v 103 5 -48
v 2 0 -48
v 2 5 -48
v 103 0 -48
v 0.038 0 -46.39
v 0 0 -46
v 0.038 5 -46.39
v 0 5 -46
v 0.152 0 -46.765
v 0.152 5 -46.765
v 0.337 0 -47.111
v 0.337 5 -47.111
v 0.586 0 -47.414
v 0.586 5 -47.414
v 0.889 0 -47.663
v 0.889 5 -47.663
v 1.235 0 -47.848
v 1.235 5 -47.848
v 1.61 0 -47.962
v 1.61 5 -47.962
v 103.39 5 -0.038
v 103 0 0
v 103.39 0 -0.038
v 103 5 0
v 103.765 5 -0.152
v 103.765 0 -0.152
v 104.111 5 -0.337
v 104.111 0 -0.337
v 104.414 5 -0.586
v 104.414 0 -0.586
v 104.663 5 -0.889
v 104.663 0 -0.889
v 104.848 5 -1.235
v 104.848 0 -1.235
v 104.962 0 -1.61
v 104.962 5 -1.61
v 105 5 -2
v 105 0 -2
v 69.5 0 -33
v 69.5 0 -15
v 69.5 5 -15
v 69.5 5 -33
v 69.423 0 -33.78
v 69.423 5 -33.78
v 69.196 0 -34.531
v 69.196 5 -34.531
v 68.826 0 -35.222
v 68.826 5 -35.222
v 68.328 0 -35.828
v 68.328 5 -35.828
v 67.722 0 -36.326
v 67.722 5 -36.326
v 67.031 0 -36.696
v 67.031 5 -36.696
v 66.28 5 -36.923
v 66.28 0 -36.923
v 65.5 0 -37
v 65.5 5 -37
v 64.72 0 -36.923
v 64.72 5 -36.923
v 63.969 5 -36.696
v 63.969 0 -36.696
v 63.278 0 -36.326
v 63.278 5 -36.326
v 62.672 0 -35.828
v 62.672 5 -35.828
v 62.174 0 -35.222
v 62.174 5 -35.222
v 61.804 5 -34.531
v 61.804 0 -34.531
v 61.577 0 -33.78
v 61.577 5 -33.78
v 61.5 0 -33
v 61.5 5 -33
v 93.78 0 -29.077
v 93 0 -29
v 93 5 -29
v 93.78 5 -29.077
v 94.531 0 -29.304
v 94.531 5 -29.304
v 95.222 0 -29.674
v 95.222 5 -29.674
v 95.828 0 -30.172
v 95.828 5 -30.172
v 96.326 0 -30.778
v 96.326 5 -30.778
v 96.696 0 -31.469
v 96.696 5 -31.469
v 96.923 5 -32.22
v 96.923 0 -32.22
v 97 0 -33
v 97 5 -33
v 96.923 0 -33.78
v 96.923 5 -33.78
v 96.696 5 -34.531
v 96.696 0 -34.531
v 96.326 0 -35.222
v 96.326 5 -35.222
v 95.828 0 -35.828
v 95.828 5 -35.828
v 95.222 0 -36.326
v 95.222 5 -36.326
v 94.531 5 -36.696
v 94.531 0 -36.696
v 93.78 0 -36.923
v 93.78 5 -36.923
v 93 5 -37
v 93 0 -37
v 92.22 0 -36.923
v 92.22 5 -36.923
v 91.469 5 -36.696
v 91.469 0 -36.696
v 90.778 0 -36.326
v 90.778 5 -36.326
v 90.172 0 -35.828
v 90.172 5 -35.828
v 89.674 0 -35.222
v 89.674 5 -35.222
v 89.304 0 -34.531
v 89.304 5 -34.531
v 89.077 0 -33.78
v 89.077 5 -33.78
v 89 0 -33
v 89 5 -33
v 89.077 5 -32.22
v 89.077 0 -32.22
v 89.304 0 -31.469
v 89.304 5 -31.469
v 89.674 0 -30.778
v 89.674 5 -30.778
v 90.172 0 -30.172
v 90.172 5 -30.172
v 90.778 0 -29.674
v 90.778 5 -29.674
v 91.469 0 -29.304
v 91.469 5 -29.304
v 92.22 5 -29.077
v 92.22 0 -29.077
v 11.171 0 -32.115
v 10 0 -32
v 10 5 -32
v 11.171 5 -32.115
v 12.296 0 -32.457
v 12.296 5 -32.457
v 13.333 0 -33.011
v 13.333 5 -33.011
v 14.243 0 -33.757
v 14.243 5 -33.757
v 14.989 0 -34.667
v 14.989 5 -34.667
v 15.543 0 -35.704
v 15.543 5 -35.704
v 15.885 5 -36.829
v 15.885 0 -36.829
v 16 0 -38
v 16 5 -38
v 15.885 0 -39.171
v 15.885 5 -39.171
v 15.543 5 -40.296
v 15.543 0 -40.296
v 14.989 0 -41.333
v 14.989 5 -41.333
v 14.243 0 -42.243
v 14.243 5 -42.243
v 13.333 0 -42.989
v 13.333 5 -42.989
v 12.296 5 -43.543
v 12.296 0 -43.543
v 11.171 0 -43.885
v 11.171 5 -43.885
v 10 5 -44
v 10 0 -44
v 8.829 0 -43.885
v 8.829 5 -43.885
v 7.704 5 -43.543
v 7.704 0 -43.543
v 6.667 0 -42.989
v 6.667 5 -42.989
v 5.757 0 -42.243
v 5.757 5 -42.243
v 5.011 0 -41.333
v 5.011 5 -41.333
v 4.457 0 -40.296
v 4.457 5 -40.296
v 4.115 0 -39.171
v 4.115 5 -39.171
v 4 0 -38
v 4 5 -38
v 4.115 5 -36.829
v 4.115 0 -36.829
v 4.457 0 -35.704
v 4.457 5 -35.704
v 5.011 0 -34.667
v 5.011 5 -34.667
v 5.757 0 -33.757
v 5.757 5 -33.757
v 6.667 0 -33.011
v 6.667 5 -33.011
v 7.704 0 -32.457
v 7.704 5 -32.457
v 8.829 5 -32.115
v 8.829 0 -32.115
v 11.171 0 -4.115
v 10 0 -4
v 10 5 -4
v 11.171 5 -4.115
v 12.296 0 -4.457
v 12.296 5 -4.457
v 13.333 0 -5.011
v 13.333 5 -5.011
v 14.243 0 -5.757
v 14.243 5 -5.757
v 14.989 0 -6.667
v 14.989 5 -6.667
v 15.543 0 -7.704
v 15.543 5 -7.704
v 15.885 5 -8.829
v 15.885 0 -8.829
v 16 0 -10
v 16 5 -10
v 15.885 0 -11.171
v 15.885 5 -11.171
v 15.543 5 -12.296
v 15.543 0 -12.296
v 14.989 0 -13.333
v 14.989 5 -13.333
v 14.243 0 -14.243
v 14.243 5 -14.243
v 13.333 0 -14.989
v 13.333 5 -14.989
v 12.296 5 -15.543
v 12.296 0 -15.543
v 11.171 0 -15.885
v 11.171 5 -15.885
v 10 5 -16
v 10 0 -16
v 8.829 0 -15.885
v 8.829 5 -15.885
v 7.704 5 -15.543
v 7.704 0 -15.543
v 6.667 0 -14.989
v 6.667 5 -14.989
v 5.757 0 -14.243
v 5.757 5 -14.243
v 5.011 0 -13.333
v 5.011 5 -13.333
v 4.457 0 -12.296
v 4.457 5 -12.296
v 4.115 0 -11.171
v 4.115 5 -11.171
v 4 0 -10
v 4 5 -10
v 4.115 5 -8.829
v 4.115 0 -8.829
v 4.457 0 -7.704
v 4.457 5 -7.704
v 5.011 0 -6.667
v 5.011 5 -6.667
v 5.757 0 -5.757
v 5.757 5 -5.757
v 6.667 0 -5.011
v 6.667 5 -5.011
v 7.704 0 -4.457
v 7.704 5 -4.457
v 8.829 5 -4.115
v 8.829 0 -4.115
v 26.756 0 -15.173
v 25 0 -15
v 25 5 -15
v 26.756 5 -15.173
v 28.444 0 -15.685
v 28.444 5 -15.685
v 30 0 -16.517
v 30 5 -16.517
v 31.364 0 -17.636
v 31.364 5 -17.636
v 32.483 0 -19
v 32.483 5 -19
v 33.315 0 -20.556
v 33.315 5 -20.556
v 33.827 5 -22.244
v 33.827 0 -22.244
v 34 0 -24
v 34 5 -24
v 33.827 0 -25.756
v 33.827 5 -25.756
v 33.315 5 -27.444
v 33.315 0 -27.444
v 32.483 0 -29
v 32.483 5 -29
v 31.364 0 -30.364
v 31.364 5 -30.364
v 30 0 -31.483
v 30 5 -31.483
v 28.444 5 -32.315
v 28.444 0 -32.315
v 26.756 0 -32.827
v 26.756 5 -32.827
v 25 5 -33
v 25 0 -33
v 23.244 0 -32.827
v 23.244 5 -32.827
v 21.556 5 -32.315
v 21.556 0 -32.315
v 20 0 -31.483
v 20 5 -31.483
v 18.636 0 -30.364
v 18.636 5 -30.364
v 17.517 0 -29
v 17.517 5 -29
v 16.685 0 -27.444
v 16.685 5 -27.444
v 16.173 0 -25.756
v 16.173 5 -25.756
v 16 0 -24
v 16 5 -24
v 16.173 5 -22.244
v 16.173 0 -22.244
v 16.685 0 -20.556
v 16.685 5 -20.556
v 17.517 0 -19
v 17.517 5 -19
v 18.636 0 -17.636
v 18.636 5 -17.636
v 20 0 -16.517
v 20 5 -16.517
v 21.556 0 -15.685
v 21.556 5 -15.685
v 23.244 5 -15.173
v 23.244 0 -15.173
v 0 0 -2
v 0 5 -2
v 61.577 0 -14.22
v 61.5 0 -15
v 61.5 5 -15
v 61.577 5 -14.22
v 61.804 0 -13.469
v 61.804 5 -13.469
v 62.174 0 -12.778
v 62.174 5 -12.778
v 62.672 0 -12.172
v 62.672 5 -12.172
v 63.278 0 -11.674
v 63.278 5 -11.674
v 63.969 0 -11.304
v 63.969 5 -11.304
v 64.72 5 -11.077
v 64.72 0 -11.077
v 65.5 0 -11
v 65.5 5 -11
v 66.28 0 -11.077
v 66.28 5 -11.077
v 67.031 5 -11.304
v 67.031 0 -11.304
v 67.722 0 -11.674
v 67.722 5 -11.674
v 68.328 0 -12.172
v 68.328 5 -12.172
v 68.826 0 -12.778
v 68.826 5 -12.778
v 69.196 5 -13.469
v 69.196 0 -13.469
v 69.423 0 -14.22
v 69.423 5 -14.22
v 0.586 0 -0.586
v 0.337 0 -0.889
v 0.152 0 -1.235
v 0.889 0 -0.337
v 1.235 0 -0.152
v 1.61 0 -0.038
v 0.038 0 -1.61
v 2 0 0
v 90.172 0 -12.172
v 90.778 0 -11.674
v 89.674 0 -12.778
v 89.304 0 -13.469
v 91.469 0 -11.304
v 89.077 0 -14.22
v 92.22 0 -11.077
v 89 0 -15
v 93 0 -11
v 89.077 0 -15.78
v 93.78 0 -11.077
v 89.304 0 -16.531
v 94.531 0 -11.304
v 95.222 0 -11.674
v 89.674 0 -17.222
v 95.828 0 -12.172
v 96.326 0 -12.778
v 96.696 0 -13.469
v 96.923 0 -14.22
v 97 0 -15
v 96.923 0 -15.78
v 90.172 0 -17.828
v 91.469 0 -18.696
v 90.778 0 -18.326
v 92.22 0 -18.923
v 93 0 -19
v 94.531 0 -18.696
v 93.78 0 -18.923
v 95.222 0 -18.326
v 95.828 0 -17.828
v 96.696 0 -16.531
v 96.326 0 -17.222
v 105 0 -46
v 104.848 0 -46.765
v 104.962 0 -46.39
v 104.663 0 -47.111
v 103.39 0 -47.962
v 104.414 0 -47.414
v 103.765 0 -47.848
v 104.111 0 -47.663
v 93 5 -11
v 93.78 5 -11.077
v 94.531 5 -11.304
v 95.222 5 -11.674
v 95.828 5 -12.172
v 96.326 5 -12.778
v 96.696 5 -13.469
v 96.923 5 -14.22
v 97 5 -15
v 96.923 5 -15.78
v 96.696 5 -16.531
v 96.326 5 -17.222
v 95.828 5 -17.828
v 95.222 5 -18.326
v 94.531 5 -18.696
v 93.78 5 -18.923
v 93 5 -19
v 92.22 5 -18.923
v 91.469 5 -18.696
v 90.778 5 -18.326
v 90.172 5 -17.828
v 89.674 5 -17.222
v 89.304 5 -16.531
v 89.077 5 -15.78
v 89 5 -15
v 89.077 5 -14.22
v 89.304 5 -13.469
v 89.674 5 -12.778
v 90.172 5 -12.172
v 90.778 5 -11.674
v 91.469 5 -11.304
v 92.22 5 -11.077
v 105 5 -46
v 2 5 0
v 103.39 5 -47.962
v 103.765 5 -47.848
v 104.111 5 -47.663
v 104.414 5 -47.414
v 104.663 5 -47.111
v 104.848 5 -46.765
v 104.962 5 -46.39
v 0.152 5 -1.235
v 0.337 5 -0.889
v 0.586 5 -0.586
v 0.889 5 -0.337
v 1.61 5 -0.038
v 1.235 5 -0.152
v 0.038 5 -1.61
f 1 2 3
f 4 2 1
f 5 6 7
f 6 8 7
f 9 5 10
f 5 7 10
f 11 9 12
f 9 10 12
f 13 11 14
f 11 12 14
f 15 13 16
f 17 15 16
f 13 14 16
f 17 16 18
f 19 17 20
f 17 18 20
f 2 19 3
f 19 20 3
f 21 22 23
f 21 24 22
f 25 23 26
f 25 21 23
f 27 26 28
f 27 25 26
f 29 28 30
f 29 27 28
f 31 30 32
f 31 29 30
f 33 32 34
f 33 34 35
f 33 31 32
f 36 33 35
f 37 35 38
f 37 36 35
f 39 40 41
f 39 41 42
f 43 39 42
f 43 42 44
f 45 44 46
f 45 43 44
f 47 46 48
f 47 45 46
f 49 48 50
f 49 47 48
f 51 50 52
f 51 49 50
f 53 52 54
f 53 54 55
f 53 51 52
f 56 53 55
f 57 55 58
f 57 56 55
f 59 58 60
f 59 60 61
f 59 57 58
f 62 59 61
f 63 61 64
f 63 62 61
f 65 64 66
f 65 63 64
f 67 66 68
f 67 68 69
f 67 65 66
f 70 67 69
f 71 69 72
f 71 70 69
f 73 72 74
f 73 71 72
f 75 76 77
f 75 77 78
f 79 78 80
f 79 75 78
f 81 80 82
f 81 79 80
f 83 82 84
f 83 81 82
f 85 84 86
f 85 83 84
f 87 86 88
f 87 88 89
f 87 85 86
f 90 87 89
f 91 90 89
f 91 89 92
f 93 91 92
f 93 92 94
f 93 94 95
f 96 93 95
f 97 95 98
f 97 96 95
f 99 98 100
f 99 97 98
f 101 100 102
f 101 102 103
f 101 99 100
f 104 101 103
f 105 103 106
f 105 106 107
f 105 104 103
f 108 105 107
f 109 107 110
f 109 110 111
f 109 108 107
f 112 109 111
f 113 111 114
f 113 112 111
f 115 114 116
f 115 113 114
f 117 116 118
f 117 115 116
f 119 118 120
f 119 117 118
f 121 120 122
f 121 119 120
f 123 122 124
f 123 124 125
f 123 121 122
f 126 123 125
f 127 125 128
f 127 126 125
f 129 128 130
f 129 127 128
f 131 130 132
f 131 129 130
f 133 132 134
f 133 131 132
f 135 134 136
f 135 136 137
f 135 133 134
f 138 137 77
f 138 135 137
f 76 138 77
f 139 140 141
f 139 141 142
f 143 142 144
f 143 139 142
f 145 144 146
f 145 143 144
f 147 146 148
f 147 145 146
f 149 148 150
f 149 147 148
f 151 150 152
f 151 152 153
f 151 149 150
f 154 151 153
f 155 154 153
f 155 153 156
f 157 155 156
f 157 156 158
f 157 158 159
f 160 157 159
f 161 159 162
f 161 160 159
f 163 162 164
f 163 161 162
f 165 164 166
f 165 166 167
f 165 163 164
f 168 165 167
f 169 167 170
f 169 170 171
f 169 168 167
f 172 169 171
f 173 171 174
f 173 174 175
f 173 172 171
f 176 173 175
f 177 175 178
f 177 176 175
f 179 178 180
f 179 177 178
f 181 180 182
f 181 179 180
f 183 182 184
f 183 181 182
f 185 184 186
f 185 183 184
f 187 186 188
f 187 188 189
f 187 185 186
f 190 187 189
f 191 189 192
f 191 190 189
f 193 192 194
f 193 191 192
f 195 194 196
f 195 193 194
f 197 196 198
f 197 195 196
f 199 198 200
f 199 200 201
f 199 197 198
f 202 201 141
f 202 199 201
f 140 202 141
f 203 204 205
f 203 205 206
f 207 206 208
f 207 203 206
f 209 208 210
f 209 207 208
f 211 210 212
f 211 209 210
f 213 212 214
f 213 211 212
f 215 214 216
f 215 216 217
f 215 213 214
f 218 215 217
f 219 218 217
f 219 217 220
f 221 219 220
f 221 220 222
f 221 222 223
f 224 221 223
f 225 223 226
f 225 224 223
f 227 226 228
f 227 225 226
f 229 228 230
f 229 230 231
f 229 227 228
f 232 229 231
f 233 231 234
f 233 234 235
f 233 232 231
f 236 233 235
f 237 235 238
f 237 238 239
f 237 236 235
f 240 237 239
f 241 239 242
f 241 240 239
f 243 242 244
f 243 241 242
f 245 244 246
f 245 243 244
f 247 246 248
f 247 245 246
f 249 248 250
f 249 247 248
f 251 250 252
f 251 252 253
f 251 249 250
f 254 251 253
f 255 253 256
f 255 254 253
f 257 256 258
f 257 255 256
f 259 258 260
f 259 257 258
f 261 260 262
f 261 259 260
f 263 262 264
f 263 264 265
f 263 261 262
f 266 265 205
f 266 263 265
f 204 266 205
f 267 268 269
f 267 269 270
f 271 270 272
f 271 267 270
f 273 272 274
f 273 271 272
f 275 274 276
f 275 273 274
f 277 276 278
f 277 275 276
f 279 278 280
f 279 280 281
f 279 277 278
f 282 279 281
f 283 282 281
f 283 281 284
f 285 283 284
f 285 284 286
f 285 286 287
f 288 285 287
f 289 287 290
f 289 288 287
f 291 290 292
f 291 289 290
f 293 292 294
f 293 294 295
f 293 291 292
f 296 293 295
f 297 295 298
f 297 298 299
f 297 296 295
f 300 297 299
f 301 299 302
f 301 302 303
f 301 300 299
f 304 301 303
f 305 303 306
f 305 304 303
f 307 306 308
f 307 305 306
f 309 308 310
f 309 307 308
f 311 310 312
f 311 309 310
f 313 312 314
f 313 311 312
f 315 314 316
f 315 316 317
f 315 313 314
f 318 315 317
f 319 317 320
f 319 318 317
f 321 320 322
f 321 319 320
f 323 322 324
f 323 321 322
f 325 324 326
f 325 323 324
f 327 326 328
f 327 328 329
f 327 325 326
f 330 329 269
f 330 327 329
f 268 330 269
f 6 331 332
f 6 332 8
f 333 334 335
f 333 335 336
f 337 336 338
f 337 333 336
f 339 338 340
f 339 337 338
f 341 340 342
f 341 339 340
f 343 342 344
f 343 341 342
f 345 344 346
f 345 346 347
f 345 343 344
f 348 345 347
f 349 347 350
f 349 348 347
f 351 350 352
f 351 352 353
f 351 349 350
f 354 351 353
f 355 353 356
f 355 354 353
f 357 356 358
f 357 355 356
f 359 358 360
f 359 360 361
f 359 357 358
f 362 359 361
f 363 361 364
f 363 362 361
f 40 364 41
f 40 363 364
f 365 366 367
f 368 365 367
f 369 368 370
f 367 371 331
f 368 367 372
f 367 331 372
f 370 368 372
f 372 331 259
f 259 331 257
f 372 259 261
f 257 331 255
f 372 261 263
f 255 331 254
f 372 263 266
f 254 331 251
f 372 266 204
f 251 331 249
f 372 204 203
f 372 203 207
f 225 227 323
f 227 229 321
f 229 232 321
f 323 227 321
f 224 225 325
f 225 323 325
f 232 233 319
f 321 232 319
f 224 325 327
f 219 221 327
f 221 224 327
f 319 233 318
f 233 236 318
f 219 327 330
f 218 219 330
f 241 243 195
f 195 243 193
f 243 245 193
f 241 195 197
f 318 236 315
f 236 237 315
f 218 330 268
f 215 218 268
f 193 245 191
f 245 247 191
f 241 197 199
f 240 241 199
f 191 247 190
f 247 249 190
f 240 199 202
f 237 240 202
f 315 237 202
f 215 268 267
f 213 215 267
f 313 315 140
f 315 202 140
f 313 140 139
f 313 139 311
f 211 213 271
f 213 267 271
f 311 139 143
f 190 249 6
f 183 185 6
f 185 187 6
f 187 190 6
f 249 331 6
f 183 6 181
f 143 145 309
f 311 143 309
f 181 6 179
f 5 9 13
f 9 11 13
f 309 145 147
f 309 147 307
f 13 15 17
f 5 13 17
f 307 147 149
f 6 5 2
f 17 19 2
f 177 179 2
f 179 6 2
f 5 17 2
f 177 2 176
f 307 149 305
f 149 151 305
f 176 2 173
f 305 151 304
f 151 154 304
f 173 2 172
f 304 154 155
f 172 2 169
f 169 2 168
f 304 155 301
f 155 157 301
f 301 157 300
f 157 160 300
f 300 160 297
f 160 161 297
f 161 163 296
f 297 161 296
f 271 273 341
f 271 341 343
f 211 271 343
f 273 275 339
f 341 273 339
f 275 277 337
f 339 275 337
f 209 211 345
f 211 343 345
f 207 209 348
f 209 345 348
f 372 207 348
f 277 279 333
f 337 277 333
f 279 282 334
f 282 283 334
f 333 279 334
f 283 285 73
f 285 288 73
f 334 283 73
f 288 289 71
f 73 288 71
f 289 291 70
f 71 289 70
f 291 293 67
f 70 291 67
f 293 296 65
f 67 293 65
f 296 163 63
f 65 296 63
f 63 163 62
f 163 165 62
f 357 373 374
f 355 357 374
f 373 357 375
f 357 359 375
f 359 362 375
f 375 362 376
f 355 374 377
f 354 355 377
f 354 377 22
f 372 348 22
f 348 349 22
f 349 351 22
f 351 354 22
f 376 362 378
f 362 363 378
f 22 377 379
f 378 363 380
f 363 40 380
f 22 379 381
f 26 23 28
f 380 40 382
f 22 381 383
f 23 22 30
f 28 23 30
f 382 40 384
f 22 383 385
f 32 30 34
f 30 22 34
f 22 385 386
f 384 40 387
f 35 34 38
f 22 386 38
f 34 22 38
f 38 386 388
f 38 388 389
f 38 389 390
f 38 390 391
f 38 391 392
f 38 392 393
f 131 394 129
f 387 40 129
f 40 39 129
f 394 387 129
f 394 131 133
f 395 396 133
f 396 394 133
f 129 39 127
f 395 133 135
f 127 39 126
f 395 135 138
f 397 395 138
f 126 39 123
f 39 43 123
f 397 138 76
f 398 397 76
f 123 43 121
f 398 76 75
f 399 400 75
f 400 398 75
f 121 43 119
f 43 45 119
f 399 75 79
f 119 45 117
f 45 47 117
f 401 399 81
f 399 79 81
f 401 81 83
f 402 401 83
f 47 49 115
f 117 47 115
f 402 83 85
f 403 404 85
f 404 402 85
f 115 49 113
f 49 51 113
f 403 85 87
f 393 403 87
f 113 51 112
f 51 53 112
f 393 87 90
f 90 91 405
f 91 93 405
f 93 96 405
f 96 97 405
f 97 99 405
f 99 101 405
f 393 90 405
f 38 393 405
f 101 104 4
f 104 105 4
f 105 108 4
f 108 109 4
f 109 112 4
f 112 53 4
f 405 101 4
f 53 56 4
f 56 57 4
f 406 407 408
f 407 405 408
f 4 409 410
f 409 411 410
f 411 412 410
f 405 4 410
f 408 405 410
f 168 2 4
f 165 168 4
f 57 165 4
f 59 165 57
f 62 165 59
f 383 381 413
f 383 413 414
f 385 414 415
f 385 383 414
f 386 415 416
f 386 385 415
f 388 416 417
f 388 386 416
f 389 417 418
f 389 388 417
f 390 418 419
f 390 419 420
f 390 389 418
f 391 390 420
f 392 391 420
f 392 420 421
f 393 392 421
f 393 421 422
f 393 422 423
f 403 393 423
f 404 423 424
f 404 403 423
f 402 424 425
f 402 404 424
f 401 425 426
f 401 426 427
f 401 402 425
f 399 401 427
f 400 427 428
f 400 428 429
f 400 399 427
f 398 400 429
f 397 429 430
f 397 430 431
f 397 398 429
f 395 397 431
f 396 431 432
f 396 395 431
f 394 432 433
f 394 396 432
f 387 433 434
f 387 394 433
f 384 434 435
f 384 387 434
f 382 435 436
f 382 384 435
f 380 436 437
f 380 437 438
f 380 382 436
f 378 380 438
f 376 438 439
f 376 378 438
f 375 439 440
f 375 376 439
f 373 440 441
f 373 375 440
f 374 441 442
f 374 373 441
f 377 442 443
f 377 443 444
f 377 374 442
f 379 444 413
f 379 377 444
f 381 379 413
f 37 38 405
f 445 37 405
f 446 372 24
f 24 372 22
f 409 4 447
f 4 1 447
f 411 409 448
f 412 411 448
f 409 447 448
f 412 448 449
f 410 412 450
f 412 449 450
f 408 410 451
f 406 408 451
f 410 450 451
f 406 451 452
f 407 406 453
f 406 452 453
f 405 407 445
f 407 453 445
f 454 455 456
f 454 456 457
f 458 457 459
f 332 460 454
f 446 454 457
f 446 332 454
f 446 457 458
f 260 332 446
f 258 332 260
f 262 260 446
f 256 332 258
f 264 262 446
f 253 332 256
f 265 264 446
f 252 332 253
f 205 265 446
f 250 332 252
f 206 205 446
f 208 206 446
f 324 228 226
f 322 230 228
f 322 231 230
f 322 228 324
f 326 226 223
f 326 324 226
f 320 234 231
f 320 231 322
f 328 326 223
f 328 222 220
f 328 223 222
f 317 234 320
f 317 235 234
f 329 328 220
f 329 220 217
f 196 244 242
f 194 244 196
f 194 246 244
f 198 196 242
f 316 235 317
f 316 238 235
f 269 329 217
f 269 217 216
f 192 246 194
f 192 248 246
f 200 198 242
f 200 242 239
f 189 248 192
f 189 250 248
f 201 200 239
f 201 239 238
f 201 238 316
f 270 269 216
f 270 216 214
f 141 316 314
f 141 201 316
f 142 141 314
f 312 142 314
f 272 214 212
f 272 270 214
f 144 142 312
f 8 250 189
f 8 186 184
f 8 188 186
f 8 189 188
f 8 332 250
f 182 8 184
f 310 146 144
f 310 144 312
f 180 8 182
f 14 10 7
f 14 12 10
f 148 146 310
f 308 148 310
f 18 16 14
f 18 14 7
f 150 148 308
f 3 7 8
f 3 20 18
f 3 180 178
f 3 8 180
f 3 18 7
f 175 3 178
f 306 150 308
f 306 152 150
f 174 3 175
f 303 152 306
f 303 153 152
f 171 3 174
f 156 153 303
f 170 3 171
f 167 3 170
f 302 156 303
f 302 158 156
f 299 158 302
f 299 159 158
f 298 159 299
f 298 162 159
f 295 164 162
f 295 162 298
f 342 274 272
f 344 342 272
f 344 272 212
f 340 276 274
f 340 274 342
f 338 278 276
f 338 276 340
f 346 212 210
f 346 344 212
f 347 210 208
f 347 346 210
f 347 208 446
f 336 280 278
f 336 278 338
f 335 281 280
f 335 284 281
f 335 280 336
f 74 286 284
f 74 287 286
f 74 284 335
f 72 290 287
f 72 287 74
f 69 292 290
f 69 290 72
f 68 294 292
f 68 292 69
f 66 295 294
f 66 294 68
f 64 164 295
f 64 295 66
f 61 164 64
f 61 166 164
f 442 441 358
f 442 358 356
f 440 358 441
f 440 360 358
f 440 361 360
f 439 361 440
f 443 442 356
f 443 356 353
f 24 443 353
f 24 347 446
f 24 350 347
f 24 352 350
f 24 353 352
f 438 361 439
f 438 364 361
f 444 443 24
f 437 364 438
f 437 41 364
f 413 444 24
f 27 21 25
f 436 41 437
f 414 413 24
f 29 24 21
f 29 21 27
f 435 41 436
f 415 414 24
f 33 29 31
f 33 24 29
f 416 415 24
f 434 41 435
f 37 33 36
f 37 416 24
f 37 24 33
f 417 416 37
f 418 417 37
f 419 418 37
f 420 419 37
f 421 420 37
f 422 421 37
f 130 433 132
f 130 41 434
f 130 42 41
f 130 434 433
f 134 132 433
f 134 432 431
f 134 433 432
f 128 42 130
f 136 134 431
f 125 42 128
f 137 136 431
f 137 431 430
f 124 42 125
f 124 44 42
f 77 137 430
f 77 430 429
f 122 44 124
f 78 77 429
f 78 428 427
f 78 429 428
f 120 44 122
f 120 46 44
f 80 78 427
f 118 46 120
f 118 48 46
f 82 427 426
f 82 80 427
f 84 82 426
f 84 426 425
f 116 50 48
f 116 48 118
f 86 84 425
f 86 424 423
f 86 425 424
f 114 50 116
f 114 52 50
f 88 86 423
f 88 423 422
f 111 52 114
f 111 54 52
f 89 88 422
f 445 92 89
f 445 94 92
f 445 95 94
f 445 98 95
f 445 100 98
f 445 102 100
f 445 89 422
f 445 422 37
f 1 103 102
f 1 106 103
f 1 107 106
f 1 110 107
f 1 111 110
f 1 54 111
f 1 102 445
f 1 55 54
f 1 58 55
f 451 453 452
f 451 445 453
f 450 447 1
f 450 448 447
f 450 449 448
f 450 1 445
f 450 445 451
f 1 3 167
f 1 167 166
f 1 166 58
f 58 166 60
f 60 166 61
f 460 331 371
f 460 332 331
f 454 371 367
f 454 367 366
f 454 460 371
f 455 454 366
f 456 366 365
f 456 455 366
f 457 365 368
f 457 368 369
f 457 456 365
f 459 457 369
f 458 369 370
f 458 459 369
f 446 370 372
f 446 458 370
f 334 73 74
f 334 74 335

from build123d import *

# Parameters (mm, degrees)
SKETCH1_W           = 105
SKETCH1_H           = 48
SKETCH1_R           = 6
SKETCH1_R_2         = 9
SKETCH1_R_3         = 4
BOSS_EXTRUDE1_DEPTH = 5
FILLET1_R           = 2


with BuildPart() as part:
    # Sketch1 → Boss-Extrude1 (new body)
    with BuildSketch(Plane(origin=(0, 0, 0), x_dir=(1, 0, 0), z_dir=(0, 1, 0))):
        with Locations((52.5, 24)):
            Rectangle(SKETCH1_W, SKETCH1_H)
        with Locations(Location((10, 10, 0), (0, 0, 270))):
            Circle(SKETCH1_R, mode=Mode.SUBTRACT)
        with Locations(Location((10, 38, 0), (0, 0, 270))):
            Circle(SKETCH1_R, mode=Mode.SUBTRACT)
        with Locations(Location((25, 24, 0), (0, 0, 270))):
            Circle(SKETCH1_R_2, mode=Mode.SUBTRACT)
        with Locations(Location((93, 15, 0), (0, 0, 270))):
            Circle(SKETCH1_R_3, mode=Mode.SUBTRACT)
        with Locations(Location((93, 33, 0), (0, 0, 270))):
            Circle(SKETCH1_R_3, mode=Mode.SUBTRACT)
        with BuildLine():
            Line((61.5, 33), (61.5, 15))
            ThreePointArc((61.5, 15), (65.5, 11), (69.5, 15))
            Line((69.5, 15), (69.5, 33))
            ThreePointArc((69.5, 33), (65.5, 37), (61.5, 33))
        make_face(mode=Mode.SUBTRACT)
    extrude(amount=BOSS_EXTRUDE1_DEPTH)

    # Fillet1
    fillet1_edges = [part.edges().sort_by_distance(p)[0] for p in [
        (0, 2.5, -48),
        (105, 2.5, -48),
        (105, 2.5, 0),
        (0, 2.5, 0),
    ]]
    fillet(fillet1_edges, radius=FILLET1_R)


solid = part.part
